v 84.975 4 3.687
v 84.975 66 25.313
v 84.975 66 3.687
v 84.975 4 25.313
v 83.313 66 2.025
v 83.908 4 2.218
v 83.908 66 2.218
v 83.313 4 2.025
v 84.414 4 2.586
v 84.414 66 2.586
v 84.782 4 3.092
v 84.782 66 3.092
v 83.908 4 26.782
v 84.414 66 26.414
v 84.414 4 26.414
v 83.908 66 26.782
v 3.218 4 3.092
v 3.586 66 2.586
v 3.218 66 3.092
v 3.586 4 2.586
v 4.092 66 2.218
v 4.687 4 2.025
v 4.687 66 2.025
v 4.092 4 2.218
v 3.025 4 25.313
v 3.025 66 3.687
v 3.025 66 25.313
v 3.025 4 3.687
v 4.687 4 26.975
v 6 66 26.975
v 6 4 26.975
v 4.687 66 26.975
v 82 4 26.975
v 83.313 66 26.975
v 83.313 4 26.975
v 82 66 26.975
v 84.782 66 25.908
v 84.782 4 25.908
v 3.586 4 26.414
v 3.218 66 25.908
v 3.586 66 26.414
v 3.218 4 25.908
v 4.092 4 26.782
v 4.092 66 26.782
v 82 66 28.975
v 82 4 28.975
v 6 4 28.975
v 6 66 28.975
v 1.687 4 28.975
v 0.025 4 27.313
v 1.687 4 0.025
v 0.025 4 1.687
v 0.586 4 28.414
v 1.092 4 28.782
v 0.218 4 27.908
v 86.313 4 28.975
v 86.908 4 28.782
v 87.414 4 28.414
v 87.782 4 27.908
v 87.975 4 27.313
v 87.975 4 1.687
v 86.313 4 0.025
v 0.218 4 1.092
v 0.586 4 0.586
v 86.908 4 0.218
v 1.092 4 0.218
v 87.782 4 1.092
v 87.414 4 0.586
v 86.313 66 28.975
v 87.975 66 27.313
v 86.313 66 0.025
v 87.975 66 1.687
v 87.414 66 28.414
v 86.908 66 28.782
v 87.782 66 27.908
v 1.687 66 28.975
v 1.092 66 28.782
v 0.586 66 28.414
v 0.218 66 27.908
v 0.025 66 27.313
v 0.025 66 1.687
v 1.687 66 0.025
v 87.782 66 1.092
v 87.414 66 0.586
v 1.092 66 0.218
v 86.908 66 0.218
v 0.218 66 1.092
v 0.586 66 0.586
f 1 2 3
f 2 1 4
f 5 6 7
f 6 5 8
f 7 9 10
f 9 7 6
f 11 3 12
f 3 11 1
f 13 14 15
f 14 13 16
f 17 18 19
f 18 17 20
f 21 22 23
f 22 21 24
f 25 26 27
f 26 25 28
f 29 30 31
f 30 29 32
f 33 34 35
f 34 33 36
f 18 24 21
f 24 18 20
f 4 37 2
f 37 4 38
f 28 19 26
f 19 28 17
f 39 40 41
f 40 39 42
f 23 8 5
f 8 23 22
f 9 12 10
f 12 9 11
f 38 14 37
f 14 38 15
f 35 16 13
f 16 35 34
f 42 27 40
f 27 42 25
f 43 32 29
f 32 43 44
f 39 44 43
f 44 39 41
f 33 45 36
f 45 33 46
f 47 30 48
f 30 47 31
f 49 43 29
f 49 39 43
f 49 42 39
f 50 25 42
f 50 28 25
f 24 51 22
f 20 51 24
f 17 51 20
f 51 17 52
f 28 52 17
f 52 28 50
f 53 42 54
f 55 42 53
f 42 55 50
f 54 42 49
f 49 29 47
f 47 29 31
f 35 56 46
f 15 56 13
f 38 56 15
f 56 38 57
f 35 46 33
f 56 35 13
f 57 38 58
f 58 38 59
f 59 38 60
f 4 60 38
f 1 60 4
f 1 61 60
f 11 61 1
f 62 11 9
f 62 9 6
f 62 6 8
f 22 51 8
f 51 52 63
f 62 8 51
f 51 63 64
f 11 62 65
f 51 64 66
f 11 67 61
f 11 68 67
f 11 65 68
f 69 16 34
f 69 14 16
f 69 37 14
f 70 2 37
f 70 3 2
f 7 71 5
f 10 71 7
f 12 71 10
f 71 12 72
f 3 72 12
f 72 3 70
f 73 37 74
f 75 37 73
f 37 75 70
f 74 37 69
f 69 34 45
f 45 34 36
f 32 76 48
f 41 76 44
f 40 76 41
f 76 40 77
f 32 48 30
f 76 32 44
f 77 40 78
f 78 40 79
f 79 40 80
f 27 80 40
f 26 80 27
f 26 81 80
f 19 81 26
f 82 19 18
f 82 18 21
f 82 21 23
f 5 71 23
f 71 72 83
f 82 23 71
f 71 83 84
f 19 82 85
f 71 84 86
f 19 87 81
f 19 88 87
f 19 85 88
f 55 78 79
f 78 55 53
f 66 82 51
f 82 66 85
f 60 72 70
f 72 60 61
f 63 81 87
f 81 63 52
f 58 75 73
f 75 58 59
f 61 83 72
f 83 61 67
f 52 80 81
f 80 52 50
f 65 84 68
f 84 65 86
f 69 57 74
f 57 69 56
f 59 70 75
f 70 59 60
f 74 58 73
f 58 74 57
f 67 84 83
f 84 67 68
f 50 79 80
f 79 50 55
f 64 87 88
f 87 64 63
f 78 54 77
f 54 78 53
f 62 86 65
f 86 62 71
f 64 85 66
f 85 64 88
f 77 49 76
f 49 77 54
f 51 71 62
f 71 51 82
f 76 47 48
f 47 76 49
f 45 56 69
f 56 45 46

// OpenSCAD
$fn=20;

length2 = 66;
width2= 82;
height2 = 25;
radius = 2;
rand   = 2;
rand6  = 3;
rand2  = 200;
rand3  = 0;
rand5  = 0;
rand4  = 6;

length = length2 + 2*rand;
width= width2 +2*rand6;
height = height2 + 2*rand;


difference(){
translate([0, 0, 0]){ 
   roundedBox(length, width, height, radius);
}
union(){
translate([rand6, rand, rand]){ 
    roundedBox(length - 2*rand, width - 2*rand6, height- 2*rand, radius);
}

translate([rand2, rand2, 2*rand-height ]){ 
    roundedBox(length - 2*rand2, width - 2*rand2, height, 0);
}
//translate([rand4, rand4, height-2*rand]){ 
translate([rand4, 0, height-2*rand]){ 
    roundedBox(length - 0*rand4, width - 2*rand4, height, 0);
}


translate([rand5, -length+rand*2, rand5 ]){ 
    roundedBox(length, width - 2*rand5, height- 2*rand5, 0);
}

translate([rand3,length-rand*2, rand3 ]){ 
    roundedBox(length , width - 2*rand3, height- 2*rand3, 0);
}

}
}

module roundedBox(length, width, height, radius)
{
    dRadius = 2*radius;
    //base rounded shape
translate([radius, radius, radius]){ 
    minkowski() {
        cube(size=[width-dRadius,length-dRadius, height-dRadius]);
        sphere(r=radius);
    } 
}
}
